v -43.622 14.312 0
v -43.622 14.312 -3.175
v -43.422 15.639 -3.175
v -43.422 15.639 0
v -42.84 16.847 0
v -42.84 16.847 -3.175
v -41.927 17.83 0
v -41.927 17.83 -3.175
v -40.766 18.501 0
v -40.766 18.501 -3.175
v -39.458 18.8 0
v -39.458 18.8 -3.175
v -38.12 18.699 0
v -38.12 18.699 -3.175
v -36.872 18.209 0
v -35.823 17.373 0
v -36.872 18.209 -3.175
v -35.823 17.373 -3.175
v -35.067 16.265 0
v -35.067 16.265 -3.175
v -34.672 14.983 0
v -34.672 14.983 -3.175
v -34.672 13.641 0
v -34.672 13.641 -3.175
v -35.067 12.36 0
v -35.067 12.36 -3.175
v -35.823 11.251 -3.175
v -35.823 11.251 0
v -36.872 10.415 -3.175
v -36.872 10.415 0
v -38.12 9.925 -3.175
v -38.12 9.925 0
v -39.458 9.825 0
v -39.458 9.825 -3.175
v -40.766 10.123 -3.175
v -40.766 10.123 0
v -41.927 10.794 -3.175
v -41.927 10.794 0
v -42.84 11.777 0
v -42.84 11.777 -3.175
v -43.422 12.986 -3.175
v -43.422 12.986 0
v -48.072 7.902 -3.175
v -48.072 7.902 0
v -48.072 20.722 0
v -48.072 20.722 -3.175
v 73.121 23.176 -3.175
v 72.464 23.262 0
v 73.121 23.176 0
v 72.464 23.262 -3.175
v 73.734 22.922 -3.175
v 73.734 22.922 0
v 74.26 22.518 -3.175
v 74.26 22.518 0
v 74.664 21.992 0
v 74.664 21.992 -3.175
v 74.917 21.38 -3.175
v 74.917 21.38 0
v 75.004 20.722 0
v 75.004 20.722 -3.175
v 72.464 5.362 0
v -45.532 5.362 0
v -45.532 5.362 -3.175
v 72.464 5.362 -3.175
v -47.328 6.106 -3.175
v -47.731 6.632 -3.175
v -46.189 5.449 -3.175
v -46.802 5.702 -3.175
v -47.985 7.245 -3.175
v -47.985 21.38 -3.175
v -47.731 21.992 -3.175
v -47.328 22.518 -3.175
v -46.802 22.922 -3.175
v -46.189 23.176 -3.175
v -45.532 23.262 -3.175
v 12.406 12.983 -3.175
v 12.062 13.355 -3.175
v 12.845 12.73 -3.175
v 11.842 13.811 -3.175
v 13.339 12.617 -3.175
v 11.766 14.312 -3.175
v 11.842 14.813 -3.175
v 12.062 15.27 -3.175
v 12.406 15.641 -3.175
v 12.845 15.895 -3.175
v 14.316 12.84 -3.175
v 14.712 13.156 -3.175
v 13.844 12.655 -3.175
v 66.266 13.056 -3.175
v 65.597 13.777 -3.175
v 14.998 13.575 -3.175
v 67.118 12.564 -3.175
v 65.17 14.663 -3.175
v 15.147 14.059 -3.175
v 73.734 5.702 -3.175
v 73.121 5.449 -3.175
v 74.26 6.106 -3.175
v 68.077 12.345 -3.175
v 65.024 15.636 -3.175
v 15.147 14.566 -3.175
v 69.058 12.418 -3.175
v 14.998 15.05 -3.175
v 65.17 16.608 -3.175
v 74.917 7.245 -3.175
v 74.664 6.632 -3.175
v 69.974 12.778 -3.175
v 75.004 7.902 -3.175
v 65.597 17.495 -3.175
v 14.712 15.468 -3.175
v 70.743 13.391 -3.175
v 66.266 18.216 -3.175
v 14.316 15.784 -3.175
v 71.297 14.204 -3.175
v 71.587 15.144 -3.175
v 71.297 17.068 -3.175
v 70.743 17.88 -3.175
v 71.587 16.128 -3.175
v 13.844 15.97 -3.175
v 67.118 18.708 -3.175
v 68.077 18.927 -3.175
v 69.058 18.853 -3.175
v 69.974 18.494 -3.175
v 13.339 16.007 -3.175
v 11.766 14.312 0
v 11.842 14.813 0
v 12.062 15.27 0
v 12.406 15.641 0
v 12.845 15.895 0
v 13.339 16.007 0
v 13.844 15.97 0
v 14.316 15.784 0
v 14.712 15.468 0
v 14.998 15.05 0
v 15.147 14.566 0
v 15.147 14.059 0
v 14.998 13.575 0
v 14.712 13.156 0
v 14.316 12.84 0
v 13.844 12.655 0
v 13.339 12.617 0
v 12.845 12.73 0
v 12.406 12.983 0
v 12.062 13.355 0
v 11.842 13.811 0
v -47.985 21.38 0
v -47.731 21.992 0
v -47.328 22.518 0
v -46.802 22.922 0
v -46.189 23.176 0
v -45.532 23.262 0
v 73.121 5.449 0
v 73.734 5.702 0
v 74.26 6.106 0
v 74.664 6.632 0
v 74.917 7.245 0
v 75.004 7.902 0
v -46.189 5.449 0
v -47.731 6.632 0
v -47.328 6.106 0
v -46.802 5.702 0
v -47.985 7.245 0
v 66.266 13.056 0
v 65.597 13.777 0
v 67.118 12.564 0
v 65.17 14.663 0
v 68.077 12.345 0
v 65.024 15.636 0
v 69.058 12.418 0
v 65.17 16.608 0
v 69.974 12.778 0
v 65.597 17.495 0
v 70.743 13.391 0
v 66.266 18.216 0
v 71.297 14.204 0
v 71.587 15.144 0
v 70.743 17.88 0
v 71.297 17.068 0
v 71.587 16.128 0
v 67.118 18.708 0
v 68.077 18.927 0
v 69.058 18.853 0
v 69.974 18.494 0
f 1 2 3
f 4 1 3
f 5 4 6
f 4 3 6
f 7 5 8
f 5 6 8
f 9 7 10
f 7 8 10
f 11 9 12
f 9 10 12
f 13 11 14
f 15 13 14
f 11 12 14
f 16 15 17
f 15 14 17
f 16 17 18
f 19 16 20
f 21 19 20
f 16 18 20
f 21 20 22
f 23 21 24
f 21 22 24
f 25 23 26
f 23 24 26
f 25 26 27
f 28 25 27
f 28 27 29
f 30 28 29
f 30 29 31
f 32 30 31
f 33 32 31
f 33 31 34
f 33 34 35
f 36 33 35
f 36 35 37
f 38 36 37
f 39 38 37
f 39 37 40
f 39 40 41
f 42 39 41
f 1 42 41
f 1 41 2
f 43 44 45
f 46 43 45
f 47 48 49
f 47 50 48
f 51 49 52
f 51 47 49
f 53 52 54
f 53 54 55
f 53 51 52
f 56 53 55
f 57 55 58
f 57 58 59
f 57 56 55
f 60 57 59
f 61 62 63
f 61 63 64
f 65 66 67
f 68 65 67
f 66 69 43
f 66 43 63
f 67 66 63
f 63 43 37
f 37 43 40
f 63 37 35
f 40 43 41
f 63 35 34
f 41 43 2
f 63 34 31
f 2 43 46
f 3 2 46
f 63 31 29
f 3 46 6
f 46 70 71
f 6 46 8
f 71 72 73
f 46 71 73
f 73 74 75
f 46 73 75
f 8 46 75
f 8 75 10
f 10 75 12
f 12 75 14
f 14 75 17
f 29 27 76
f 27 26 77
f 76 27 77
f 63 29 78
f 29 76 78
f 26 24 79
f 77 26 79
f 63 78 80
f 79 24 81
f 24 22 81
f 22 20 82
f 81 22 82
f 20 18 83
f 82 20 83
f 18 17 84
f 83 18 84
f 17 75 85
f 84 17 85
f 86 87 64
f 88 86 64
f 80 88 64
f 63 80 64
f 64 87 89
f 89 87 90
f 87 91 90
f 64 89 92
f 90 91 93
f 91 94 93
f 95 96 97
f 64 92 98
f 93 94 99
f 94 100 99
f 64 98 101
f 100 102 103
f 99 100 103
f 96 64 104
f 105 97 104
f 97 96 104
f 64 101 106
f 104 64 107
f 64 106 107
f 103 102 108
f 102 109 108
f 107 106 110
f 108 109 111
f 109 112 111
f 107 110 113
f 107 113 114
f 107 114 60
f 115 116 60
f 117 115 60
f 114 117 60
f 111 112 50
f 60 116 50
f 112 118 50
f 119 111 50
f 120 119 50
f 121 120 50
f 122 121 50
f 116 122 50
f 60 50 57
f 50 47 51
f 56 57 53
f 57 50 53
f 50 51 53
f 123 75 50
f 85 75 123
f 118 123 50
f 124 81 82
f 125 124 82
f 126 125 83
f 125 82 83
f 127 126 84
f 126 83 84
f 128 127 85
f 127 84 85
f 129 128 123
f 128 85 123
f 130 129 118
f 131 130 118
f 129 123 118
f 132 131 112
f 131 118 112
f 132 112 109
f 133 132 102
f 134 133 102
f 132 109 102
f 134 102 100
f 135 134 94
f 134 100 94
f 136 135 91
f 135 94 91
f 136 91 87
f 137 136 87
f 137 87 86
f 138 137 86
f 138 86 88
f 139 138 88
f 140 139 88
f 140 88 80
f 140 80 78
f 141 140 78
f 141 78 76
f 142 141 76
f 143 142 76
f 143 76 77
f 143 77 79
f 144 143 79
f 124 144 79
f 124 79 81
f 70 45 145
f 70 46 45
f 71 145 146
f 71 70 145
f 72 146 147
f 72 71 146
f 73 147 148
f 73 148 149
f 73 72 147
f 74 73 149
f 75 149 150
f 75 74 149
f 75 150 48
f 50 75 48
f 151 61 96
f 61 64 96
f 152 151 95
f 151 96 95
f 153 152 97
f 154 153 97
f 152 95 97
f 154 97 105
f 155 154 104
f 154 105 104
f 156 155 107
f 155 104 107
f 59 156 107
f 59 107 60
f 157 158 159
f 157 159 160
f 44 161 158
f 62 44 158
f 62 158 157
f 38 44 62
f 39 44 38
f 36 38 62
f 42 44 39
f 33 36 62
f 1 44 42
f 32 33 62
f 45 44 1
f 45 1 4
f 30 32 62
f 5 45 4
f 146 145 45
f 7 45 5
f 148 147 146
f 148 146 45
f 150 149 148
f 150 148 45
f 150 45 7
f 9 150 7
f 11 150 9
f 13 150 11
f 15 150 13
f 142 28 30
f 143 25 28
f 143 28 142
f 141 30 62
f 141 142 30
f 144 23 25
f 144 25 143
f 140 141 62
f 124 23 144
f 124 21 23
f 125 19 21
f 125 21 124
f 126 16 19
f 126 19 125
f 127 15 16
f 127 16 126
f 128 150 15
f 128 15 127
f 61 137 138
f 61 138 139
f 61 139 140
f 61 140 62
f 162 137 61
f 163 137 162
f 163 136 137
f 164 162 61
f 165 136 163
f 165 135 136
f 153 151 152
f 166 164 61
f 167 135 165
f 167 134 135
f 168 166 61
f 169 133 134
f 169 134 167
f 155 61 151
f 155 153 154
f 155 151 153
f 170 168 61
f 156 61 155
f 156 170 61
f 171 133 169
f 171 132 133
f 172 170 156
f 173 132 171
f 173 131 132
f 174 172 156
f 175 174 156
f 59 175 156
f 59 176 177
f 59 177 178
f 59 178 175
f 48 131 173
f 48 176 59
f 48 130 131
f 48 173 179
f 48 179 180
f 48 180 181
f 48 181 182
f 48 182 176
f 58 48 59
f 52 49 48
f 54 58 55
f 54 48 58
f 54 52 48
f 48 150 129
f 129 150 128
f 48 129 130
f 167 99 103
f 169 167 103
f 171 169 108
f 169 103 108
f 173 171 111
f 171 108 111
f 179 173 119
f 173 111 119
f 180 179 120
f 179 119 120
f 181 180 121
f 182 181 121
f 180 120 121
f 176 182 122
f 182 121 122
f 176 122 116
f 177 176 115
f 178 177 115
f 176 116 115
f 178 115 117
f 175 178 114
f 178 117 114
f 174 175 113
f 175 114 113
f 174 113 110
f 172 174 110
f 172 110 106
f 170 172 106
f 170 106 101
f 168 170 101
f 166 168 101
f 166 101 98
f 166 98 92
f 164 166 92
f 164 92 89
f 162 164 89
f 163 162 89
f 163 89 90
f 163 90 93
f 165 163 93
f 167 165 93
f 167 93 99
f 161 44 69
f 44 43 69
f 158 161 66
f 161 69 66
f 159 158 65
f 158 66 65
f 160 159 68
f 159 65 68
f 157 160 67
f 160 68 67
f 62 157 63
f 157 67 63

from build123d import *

# Parameters (mm, degrees)
SKETCH1_W            = 123.075797847
SKETCH1_H            = 17.9
SKETCH1_R            = 2
SKETCH1_R_2          = 2.54
BASE_FLANGE1_DEPTH   = 3.175
FILLET1_R            = 2.54
M8_CLEARANCE_HOLE1_D = 9
M6_CLEARANCE_HOLE1_D = 6.6
SKETCH10_R           = 1
CUT_EXTRUDE1_DEPTH   = 79.592687586
M3_CLEARANCE_HOLE2_D = 3.4


# Sheet-metal steps are written as plain solids
with BuildPart() as part:
    # Sketch1 → Base-Flange1 (new body)
    with BuildSketch(Plane.XY):
        with Locations((13.466115103, 14.312153748)):
            Rectangle(SKETCH1_W, SKETCH1_H)
        with Locations((-39.121783821, 14.312153748)):
            Circle(SKETCH1_R, mode=Mode.SUBTRACT)
        with Locations((68.323814026, 15.635739427)):
            Circle(SKETCH1_R_2, mode=Mode.SUBTRACT)
    extrude(amount=-BASE_FLANGE1_DEPTH)

    # Fillet1
    fillet1_edges = [part.edges().sort_by_distance(p)[0] for p in [
        (-48.071783821, 23.262153748, -1.5875),
        (75.004014026, 23.262153748, -1.5875),
        (75.004014026, 5.362153748, -1.5875),
        (-48.071783821, 5.362153748, -1.5875),
    ]]
    fillet(fillet1_edges, radius=FILLET1_R)

    # M8 Clearance Hole1 (through all)
    with Locations(Plane.XY):
        with Locations((-39.121783821, 14.312153748)):
            Hole(M8_CLEARANCE_HOLE1_D / 2)

    # M6 Clearance Hole1 (through all)
    with Locations(Plane.XY):
        with Locations((68.323814026, 15.635739427)):
            Hole(M6_CLEARANCE_HOLE1_D / 2)

    # Sketch10 → Cut-Extrude1 (cut, through all)
    with BuildSketch(Plane.XY):
        with Locations((13.466115103, 14.312153748)):
            Circle(SKETCH10_R)
    extrude(amount=-CUT_EXTRUDE1_DEPTH, mode=Mode.SUBTRACT)

    # M3 Clearance Hole2 (through all)
    with Locations(Plane.XY):
        with Locations((13.466115103, 14.312153748)):
            Hole(M3_CLEARANCE_HOLE2_D / 2)


solid = part.part
